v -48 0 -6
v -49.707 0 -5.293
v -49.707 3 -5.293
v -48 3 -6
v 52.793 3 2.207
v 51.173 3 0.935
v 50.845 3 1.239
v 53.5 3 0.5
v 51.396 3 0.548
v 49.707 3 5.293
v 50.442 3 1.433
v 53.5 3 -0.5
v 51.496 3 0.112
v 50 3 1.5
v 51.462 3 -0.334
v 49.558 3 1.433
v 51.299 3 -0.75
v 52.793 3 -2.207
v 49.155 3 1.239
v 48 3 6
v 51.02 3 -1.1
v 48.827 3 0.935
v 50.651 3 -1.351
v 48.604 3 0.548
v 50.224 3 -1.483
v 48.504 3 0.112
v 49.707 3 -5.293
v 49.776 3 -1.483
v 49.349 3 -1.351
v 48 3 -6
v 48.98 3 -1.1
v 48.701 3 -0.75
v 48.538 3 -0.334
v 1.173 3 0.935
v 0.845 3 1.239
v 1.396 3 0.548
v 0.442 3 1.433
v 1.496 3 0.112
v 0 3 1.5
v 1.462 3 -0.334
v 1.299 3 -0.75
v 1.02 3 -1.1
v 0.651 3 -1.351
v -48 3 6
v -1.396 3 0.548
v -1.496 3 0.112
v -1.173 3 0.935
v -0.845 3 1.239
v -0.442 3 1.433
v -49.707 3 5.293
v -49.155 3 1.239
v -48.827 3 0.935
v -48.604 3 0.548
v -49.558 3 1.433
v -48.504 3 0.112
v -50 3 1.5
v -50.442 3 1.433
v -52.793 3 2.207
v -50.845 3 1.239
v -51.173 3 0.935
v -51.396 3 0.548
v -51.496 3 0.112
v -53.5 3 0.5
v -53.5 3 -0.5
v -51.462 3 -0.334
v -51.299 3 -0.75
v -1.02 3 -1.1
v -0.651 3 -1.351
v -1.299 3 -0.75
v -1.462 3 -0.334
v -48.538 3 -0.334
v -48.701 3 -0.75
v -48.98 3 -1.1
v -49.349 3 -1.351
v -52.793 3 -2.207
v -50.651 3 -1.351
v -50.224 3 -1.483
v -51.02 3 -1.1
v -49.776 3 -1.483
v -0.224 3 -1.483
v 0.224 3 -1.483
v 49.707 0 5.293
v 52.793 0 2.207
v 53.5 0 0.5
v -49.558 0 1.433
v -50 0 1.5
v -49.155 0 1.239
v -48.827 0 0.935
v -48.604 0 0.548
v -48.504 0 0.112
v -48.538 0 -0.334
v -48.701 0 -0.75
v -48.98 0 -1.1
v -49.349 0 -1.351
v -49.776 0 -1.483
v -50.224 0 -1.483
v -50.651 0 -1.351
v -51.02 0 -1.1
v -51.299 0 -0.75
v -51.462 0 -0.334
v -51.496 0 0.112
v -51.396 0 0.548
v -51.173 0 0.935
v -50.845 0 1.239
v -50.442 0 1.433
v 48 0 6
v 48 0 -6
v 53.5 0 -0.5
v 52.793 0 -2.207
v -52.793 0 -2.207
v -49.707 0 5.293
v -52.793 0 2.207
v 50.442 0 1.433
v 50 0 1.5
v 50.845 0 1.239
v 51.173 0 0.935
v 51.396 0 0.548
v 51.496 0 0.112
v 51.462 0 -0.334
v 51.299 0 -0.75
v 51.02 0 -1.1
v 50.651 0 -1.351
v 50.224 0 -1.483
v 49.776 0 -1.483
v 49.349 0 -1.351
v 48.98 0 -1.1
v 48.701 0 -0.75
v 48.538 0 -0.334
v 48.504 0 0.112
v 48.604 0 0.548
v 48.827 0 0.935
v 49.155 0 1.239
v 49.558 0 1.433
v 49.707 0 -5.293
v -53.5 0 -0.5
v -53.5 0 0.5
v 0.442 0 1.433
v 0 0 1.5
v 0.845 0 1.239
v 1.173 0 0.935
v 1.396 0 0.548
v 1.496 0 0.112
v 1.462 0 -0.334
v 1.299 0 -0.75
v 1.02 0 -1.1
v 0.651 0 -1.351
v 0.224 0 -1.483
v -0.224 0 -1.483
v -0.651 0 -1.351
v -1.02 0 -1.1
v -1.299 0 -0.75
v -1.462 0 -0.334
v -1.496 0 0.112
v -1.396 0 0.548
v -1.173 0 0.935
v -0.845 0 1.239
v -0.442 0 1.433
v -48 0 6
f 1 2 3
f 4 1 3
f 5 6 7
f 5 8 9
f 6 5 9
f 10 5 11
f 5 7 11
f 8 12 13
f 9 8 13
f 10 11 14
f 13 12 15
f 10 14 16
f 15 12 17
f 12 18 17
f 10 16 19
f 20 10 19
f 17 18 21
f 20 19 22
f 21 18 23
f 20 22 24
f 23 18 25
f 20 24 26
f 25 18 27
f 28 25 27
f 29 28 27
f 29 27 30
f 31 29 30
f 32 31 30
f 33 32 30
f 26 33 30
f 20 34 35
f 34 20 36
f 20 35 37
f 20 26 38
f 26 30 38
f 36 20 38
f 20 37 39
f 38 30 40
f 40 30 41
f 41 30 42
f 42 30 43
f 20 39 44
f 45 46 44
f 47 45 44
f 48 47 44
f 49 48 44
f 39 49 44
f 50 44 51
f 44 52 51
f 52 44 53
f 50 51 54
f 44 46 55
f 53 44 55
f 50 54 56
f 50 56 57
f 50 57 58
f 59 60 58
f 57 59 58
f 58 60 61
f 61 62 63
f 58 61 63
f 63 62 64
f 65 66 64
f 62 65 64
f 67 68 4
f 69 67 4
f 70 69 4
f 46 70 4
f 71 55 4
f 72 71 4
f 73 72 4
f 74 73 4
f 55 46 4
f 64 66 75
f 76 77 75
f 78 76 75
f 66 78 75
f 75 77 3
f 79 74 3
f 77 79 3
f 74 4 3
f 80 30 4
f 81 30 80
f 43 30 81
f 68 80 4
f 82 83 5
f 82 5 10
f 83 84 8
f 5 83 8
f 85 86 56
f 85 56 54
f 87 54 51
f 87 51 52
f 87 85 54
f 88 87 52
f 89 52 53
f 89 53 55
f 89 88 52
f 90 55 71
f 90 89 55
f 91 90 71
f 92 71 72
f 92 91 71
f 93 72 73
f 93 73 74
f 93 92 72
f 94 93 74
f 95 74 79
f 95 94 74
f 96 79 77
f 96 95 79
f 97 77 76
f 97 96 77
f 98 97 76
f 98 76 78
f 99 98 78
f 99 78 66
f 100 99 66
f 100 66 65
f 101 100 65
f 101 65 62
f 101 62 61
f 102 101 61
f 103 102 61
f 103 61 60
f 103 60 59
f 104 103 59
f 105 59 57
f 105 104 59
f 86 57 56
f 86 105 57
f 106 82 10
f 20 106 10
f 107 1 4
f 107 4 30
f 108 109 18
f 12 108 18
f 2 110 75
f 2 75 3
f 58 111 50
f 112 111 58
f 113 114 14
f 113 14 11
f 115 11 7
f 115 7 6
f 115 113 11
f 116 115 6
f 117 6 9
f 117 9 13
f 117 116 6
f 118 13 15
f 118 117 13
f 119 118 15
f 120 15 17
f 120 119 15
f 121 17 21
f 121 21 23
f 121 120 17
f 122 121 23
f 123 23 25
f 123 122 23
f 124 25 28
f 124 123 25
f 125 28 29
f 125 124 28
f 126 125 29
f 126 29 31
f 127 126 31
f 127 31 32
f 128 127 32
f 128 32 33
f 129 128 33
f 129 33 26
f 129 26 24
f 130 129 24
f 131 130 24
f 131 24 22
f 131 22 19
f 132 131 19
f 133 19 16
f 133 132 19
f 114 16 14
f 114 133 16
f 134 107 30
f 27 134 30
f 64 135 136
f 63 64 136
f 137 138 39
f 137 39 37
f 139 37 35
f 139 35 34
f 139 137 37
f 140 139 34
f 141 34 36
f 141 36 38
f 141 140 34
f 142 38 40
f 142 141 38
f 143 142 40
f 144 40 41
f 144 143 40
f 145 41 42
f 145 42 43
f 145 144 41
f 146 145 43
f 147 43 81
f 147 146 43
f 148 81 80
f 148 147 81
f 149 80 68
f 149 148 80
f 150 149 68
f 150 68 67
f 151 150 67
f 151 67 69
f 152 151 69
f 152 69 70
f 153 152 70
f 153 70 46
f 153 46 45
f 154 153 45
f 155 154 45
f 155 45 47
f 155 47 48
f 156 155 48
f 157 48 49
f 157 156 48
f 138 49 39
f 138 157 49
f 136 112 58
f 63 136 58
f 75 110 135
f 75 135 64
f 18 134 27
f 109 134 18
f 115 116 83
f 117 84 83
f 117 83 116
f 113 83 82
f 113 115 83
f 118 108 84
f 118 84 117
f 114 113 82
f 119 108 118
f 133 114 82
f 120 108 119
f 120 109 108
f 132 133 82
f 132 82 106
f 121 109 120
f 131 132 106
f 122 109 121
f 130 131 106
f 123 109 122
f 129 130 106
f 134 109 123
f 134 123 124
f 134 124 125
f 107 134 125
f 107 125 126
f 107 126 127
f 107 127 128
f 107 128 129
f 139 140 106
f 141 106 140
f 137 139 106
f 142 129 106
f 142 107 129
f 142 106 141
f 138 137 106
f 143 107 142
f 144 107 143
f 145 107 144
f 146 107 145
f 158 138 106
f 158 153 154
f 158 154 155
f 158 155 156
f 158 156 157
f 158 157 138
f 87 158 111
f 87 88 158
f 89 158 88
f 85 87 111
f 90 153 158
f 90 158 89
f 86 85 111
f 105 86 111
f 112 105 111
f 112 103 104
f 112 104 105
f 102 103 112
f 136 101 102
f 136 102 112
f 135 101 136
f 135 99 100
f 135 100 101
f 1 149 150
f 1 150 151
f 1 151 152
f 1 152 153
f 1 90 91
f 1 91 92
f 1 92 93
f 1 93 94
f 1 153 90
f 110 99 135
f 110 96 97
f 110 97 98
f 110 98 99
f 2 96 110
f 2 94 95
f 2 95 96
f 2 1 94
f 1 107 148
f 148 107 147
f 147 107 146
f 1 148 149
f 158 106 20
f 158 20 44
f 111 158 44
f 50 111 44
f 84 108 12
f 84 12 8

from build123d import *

# Parameters (mm, degrees)
SKETCH1_R               = 1.5
BOSS_EXTRUDE1_DEPTH     = 3
CUT_EXTRUDE1_DEPTH      = 56.407580709
CUT_EXTRUDE1_DEPTH_BACK = 56.407580709
CUT_EXTRUDE2_DEPTH      = 54.918920612
CUT_EXTRUDE2_DEPTH_BACK = 54.918920612
CHAMFER1_SIZE           = 1


with BuildPart() as part:
    # Sketch1 → Boss-Extrude1 (new body)
    with BuildSketch(Plane(origin=(0, 0, 0), x_dir=(1, 0, 0), z_dir=(0, 1, 0))):
        Polygon((-55, 3), (-52, 6), (52, 6), (55, 3), (55, -3), (52, -6), (-52, -6), (-55, -3), align=None)
        with Locations(Location((-50, 0, 0), (0, 0, 270))):
            Circle(SKETCH1_R, mode=Mode.SUBTRACT)
        with Locations(Location((0, 0, 0), (0, 0, 270))):
            Circle(SKETCH1_R, mode=Mode.SUBTRACT)
        with Locations(Location((50, 0, 0), (0, 0, 270))):
            Circle(SKETCH1_R, mode=Mode.SUBTRACT)
    extrude(amount=BOSS_EXTRUDE1_DEPTH)

    # Sketch2 → Cut-Extrude1 (cut, two sides: drawn at the far end of the back side and taken through both)
    with BuildSketch(Plane(origin=(0, 3, 0), x_dir=(1, 0, 0), z_dir=(0, 1, 0)).offset(-CUT_EXTRUDE1_DEPTH_BACK)):
        Polygon((-53.5, 4.5), (-53.5, -4.5), (-55, -3), (-55, 3), align=None)
        Polygon((53.5, -4.5), (55, -3), (55, 3), (53.5, 4.5), align=None)
    extrude(amount=CUT_EXTRUDE1_DEPTH + CUT_EXTRUDE1_DEPTH_BACK, mode=Mode.SUBTRACT)

    # Sketch3 → Cut-Extrude2 (cut, two sides: drawn at the far end of the back side and taken through both)
    with BuildSketch(Plane(origin=(0, 3, 0), x_dir=(1, 0, 0), z_dir=(0, 1, 0)).offset(-CUT_EXTRUDE2_DEPTH_BACK)):
        Polygon((-49, -6), (-53.5, -1.5), (-53.5, -4.5), (-52, -6), align=None)
        Polygon((-53.5, 4.5), (-53.5, 1.5), (-49, 6), (-52, 6), align=None)
        Polygon((52, 6), (49, 6), (53.5, 1.5), (53.5, 4.5), align=None)
        Polygon((53.5, -1.5), (49, -6), (52, -6), (53.5, -4.5), align=None)
    extrude(amount=CUT_EXTRUDE2_DEPTH + CUT_EXTRUDE2_DEPTH_BACK, mode=Mode.SUBTRACT)

    # Chamfer1
    chamfer1_edges = [part.edges().sort_by_distance(p)[0] for p in [
        (49, 1.5, -6),
        (53.5, 1.5, -1.5),
        (-53.5, 1.5, -1.5),
        (-49, 1.5, -6),
        (-49, 1.5, 6),
        (-53.5, 1.5, 1.5),
        (53.5, 1.5, 1.5),
        (49, 1.5, 6),
    ]]
    chamfer(chamfer1_edges, length=CHAMFER1_SIZE)


solid = part.part
